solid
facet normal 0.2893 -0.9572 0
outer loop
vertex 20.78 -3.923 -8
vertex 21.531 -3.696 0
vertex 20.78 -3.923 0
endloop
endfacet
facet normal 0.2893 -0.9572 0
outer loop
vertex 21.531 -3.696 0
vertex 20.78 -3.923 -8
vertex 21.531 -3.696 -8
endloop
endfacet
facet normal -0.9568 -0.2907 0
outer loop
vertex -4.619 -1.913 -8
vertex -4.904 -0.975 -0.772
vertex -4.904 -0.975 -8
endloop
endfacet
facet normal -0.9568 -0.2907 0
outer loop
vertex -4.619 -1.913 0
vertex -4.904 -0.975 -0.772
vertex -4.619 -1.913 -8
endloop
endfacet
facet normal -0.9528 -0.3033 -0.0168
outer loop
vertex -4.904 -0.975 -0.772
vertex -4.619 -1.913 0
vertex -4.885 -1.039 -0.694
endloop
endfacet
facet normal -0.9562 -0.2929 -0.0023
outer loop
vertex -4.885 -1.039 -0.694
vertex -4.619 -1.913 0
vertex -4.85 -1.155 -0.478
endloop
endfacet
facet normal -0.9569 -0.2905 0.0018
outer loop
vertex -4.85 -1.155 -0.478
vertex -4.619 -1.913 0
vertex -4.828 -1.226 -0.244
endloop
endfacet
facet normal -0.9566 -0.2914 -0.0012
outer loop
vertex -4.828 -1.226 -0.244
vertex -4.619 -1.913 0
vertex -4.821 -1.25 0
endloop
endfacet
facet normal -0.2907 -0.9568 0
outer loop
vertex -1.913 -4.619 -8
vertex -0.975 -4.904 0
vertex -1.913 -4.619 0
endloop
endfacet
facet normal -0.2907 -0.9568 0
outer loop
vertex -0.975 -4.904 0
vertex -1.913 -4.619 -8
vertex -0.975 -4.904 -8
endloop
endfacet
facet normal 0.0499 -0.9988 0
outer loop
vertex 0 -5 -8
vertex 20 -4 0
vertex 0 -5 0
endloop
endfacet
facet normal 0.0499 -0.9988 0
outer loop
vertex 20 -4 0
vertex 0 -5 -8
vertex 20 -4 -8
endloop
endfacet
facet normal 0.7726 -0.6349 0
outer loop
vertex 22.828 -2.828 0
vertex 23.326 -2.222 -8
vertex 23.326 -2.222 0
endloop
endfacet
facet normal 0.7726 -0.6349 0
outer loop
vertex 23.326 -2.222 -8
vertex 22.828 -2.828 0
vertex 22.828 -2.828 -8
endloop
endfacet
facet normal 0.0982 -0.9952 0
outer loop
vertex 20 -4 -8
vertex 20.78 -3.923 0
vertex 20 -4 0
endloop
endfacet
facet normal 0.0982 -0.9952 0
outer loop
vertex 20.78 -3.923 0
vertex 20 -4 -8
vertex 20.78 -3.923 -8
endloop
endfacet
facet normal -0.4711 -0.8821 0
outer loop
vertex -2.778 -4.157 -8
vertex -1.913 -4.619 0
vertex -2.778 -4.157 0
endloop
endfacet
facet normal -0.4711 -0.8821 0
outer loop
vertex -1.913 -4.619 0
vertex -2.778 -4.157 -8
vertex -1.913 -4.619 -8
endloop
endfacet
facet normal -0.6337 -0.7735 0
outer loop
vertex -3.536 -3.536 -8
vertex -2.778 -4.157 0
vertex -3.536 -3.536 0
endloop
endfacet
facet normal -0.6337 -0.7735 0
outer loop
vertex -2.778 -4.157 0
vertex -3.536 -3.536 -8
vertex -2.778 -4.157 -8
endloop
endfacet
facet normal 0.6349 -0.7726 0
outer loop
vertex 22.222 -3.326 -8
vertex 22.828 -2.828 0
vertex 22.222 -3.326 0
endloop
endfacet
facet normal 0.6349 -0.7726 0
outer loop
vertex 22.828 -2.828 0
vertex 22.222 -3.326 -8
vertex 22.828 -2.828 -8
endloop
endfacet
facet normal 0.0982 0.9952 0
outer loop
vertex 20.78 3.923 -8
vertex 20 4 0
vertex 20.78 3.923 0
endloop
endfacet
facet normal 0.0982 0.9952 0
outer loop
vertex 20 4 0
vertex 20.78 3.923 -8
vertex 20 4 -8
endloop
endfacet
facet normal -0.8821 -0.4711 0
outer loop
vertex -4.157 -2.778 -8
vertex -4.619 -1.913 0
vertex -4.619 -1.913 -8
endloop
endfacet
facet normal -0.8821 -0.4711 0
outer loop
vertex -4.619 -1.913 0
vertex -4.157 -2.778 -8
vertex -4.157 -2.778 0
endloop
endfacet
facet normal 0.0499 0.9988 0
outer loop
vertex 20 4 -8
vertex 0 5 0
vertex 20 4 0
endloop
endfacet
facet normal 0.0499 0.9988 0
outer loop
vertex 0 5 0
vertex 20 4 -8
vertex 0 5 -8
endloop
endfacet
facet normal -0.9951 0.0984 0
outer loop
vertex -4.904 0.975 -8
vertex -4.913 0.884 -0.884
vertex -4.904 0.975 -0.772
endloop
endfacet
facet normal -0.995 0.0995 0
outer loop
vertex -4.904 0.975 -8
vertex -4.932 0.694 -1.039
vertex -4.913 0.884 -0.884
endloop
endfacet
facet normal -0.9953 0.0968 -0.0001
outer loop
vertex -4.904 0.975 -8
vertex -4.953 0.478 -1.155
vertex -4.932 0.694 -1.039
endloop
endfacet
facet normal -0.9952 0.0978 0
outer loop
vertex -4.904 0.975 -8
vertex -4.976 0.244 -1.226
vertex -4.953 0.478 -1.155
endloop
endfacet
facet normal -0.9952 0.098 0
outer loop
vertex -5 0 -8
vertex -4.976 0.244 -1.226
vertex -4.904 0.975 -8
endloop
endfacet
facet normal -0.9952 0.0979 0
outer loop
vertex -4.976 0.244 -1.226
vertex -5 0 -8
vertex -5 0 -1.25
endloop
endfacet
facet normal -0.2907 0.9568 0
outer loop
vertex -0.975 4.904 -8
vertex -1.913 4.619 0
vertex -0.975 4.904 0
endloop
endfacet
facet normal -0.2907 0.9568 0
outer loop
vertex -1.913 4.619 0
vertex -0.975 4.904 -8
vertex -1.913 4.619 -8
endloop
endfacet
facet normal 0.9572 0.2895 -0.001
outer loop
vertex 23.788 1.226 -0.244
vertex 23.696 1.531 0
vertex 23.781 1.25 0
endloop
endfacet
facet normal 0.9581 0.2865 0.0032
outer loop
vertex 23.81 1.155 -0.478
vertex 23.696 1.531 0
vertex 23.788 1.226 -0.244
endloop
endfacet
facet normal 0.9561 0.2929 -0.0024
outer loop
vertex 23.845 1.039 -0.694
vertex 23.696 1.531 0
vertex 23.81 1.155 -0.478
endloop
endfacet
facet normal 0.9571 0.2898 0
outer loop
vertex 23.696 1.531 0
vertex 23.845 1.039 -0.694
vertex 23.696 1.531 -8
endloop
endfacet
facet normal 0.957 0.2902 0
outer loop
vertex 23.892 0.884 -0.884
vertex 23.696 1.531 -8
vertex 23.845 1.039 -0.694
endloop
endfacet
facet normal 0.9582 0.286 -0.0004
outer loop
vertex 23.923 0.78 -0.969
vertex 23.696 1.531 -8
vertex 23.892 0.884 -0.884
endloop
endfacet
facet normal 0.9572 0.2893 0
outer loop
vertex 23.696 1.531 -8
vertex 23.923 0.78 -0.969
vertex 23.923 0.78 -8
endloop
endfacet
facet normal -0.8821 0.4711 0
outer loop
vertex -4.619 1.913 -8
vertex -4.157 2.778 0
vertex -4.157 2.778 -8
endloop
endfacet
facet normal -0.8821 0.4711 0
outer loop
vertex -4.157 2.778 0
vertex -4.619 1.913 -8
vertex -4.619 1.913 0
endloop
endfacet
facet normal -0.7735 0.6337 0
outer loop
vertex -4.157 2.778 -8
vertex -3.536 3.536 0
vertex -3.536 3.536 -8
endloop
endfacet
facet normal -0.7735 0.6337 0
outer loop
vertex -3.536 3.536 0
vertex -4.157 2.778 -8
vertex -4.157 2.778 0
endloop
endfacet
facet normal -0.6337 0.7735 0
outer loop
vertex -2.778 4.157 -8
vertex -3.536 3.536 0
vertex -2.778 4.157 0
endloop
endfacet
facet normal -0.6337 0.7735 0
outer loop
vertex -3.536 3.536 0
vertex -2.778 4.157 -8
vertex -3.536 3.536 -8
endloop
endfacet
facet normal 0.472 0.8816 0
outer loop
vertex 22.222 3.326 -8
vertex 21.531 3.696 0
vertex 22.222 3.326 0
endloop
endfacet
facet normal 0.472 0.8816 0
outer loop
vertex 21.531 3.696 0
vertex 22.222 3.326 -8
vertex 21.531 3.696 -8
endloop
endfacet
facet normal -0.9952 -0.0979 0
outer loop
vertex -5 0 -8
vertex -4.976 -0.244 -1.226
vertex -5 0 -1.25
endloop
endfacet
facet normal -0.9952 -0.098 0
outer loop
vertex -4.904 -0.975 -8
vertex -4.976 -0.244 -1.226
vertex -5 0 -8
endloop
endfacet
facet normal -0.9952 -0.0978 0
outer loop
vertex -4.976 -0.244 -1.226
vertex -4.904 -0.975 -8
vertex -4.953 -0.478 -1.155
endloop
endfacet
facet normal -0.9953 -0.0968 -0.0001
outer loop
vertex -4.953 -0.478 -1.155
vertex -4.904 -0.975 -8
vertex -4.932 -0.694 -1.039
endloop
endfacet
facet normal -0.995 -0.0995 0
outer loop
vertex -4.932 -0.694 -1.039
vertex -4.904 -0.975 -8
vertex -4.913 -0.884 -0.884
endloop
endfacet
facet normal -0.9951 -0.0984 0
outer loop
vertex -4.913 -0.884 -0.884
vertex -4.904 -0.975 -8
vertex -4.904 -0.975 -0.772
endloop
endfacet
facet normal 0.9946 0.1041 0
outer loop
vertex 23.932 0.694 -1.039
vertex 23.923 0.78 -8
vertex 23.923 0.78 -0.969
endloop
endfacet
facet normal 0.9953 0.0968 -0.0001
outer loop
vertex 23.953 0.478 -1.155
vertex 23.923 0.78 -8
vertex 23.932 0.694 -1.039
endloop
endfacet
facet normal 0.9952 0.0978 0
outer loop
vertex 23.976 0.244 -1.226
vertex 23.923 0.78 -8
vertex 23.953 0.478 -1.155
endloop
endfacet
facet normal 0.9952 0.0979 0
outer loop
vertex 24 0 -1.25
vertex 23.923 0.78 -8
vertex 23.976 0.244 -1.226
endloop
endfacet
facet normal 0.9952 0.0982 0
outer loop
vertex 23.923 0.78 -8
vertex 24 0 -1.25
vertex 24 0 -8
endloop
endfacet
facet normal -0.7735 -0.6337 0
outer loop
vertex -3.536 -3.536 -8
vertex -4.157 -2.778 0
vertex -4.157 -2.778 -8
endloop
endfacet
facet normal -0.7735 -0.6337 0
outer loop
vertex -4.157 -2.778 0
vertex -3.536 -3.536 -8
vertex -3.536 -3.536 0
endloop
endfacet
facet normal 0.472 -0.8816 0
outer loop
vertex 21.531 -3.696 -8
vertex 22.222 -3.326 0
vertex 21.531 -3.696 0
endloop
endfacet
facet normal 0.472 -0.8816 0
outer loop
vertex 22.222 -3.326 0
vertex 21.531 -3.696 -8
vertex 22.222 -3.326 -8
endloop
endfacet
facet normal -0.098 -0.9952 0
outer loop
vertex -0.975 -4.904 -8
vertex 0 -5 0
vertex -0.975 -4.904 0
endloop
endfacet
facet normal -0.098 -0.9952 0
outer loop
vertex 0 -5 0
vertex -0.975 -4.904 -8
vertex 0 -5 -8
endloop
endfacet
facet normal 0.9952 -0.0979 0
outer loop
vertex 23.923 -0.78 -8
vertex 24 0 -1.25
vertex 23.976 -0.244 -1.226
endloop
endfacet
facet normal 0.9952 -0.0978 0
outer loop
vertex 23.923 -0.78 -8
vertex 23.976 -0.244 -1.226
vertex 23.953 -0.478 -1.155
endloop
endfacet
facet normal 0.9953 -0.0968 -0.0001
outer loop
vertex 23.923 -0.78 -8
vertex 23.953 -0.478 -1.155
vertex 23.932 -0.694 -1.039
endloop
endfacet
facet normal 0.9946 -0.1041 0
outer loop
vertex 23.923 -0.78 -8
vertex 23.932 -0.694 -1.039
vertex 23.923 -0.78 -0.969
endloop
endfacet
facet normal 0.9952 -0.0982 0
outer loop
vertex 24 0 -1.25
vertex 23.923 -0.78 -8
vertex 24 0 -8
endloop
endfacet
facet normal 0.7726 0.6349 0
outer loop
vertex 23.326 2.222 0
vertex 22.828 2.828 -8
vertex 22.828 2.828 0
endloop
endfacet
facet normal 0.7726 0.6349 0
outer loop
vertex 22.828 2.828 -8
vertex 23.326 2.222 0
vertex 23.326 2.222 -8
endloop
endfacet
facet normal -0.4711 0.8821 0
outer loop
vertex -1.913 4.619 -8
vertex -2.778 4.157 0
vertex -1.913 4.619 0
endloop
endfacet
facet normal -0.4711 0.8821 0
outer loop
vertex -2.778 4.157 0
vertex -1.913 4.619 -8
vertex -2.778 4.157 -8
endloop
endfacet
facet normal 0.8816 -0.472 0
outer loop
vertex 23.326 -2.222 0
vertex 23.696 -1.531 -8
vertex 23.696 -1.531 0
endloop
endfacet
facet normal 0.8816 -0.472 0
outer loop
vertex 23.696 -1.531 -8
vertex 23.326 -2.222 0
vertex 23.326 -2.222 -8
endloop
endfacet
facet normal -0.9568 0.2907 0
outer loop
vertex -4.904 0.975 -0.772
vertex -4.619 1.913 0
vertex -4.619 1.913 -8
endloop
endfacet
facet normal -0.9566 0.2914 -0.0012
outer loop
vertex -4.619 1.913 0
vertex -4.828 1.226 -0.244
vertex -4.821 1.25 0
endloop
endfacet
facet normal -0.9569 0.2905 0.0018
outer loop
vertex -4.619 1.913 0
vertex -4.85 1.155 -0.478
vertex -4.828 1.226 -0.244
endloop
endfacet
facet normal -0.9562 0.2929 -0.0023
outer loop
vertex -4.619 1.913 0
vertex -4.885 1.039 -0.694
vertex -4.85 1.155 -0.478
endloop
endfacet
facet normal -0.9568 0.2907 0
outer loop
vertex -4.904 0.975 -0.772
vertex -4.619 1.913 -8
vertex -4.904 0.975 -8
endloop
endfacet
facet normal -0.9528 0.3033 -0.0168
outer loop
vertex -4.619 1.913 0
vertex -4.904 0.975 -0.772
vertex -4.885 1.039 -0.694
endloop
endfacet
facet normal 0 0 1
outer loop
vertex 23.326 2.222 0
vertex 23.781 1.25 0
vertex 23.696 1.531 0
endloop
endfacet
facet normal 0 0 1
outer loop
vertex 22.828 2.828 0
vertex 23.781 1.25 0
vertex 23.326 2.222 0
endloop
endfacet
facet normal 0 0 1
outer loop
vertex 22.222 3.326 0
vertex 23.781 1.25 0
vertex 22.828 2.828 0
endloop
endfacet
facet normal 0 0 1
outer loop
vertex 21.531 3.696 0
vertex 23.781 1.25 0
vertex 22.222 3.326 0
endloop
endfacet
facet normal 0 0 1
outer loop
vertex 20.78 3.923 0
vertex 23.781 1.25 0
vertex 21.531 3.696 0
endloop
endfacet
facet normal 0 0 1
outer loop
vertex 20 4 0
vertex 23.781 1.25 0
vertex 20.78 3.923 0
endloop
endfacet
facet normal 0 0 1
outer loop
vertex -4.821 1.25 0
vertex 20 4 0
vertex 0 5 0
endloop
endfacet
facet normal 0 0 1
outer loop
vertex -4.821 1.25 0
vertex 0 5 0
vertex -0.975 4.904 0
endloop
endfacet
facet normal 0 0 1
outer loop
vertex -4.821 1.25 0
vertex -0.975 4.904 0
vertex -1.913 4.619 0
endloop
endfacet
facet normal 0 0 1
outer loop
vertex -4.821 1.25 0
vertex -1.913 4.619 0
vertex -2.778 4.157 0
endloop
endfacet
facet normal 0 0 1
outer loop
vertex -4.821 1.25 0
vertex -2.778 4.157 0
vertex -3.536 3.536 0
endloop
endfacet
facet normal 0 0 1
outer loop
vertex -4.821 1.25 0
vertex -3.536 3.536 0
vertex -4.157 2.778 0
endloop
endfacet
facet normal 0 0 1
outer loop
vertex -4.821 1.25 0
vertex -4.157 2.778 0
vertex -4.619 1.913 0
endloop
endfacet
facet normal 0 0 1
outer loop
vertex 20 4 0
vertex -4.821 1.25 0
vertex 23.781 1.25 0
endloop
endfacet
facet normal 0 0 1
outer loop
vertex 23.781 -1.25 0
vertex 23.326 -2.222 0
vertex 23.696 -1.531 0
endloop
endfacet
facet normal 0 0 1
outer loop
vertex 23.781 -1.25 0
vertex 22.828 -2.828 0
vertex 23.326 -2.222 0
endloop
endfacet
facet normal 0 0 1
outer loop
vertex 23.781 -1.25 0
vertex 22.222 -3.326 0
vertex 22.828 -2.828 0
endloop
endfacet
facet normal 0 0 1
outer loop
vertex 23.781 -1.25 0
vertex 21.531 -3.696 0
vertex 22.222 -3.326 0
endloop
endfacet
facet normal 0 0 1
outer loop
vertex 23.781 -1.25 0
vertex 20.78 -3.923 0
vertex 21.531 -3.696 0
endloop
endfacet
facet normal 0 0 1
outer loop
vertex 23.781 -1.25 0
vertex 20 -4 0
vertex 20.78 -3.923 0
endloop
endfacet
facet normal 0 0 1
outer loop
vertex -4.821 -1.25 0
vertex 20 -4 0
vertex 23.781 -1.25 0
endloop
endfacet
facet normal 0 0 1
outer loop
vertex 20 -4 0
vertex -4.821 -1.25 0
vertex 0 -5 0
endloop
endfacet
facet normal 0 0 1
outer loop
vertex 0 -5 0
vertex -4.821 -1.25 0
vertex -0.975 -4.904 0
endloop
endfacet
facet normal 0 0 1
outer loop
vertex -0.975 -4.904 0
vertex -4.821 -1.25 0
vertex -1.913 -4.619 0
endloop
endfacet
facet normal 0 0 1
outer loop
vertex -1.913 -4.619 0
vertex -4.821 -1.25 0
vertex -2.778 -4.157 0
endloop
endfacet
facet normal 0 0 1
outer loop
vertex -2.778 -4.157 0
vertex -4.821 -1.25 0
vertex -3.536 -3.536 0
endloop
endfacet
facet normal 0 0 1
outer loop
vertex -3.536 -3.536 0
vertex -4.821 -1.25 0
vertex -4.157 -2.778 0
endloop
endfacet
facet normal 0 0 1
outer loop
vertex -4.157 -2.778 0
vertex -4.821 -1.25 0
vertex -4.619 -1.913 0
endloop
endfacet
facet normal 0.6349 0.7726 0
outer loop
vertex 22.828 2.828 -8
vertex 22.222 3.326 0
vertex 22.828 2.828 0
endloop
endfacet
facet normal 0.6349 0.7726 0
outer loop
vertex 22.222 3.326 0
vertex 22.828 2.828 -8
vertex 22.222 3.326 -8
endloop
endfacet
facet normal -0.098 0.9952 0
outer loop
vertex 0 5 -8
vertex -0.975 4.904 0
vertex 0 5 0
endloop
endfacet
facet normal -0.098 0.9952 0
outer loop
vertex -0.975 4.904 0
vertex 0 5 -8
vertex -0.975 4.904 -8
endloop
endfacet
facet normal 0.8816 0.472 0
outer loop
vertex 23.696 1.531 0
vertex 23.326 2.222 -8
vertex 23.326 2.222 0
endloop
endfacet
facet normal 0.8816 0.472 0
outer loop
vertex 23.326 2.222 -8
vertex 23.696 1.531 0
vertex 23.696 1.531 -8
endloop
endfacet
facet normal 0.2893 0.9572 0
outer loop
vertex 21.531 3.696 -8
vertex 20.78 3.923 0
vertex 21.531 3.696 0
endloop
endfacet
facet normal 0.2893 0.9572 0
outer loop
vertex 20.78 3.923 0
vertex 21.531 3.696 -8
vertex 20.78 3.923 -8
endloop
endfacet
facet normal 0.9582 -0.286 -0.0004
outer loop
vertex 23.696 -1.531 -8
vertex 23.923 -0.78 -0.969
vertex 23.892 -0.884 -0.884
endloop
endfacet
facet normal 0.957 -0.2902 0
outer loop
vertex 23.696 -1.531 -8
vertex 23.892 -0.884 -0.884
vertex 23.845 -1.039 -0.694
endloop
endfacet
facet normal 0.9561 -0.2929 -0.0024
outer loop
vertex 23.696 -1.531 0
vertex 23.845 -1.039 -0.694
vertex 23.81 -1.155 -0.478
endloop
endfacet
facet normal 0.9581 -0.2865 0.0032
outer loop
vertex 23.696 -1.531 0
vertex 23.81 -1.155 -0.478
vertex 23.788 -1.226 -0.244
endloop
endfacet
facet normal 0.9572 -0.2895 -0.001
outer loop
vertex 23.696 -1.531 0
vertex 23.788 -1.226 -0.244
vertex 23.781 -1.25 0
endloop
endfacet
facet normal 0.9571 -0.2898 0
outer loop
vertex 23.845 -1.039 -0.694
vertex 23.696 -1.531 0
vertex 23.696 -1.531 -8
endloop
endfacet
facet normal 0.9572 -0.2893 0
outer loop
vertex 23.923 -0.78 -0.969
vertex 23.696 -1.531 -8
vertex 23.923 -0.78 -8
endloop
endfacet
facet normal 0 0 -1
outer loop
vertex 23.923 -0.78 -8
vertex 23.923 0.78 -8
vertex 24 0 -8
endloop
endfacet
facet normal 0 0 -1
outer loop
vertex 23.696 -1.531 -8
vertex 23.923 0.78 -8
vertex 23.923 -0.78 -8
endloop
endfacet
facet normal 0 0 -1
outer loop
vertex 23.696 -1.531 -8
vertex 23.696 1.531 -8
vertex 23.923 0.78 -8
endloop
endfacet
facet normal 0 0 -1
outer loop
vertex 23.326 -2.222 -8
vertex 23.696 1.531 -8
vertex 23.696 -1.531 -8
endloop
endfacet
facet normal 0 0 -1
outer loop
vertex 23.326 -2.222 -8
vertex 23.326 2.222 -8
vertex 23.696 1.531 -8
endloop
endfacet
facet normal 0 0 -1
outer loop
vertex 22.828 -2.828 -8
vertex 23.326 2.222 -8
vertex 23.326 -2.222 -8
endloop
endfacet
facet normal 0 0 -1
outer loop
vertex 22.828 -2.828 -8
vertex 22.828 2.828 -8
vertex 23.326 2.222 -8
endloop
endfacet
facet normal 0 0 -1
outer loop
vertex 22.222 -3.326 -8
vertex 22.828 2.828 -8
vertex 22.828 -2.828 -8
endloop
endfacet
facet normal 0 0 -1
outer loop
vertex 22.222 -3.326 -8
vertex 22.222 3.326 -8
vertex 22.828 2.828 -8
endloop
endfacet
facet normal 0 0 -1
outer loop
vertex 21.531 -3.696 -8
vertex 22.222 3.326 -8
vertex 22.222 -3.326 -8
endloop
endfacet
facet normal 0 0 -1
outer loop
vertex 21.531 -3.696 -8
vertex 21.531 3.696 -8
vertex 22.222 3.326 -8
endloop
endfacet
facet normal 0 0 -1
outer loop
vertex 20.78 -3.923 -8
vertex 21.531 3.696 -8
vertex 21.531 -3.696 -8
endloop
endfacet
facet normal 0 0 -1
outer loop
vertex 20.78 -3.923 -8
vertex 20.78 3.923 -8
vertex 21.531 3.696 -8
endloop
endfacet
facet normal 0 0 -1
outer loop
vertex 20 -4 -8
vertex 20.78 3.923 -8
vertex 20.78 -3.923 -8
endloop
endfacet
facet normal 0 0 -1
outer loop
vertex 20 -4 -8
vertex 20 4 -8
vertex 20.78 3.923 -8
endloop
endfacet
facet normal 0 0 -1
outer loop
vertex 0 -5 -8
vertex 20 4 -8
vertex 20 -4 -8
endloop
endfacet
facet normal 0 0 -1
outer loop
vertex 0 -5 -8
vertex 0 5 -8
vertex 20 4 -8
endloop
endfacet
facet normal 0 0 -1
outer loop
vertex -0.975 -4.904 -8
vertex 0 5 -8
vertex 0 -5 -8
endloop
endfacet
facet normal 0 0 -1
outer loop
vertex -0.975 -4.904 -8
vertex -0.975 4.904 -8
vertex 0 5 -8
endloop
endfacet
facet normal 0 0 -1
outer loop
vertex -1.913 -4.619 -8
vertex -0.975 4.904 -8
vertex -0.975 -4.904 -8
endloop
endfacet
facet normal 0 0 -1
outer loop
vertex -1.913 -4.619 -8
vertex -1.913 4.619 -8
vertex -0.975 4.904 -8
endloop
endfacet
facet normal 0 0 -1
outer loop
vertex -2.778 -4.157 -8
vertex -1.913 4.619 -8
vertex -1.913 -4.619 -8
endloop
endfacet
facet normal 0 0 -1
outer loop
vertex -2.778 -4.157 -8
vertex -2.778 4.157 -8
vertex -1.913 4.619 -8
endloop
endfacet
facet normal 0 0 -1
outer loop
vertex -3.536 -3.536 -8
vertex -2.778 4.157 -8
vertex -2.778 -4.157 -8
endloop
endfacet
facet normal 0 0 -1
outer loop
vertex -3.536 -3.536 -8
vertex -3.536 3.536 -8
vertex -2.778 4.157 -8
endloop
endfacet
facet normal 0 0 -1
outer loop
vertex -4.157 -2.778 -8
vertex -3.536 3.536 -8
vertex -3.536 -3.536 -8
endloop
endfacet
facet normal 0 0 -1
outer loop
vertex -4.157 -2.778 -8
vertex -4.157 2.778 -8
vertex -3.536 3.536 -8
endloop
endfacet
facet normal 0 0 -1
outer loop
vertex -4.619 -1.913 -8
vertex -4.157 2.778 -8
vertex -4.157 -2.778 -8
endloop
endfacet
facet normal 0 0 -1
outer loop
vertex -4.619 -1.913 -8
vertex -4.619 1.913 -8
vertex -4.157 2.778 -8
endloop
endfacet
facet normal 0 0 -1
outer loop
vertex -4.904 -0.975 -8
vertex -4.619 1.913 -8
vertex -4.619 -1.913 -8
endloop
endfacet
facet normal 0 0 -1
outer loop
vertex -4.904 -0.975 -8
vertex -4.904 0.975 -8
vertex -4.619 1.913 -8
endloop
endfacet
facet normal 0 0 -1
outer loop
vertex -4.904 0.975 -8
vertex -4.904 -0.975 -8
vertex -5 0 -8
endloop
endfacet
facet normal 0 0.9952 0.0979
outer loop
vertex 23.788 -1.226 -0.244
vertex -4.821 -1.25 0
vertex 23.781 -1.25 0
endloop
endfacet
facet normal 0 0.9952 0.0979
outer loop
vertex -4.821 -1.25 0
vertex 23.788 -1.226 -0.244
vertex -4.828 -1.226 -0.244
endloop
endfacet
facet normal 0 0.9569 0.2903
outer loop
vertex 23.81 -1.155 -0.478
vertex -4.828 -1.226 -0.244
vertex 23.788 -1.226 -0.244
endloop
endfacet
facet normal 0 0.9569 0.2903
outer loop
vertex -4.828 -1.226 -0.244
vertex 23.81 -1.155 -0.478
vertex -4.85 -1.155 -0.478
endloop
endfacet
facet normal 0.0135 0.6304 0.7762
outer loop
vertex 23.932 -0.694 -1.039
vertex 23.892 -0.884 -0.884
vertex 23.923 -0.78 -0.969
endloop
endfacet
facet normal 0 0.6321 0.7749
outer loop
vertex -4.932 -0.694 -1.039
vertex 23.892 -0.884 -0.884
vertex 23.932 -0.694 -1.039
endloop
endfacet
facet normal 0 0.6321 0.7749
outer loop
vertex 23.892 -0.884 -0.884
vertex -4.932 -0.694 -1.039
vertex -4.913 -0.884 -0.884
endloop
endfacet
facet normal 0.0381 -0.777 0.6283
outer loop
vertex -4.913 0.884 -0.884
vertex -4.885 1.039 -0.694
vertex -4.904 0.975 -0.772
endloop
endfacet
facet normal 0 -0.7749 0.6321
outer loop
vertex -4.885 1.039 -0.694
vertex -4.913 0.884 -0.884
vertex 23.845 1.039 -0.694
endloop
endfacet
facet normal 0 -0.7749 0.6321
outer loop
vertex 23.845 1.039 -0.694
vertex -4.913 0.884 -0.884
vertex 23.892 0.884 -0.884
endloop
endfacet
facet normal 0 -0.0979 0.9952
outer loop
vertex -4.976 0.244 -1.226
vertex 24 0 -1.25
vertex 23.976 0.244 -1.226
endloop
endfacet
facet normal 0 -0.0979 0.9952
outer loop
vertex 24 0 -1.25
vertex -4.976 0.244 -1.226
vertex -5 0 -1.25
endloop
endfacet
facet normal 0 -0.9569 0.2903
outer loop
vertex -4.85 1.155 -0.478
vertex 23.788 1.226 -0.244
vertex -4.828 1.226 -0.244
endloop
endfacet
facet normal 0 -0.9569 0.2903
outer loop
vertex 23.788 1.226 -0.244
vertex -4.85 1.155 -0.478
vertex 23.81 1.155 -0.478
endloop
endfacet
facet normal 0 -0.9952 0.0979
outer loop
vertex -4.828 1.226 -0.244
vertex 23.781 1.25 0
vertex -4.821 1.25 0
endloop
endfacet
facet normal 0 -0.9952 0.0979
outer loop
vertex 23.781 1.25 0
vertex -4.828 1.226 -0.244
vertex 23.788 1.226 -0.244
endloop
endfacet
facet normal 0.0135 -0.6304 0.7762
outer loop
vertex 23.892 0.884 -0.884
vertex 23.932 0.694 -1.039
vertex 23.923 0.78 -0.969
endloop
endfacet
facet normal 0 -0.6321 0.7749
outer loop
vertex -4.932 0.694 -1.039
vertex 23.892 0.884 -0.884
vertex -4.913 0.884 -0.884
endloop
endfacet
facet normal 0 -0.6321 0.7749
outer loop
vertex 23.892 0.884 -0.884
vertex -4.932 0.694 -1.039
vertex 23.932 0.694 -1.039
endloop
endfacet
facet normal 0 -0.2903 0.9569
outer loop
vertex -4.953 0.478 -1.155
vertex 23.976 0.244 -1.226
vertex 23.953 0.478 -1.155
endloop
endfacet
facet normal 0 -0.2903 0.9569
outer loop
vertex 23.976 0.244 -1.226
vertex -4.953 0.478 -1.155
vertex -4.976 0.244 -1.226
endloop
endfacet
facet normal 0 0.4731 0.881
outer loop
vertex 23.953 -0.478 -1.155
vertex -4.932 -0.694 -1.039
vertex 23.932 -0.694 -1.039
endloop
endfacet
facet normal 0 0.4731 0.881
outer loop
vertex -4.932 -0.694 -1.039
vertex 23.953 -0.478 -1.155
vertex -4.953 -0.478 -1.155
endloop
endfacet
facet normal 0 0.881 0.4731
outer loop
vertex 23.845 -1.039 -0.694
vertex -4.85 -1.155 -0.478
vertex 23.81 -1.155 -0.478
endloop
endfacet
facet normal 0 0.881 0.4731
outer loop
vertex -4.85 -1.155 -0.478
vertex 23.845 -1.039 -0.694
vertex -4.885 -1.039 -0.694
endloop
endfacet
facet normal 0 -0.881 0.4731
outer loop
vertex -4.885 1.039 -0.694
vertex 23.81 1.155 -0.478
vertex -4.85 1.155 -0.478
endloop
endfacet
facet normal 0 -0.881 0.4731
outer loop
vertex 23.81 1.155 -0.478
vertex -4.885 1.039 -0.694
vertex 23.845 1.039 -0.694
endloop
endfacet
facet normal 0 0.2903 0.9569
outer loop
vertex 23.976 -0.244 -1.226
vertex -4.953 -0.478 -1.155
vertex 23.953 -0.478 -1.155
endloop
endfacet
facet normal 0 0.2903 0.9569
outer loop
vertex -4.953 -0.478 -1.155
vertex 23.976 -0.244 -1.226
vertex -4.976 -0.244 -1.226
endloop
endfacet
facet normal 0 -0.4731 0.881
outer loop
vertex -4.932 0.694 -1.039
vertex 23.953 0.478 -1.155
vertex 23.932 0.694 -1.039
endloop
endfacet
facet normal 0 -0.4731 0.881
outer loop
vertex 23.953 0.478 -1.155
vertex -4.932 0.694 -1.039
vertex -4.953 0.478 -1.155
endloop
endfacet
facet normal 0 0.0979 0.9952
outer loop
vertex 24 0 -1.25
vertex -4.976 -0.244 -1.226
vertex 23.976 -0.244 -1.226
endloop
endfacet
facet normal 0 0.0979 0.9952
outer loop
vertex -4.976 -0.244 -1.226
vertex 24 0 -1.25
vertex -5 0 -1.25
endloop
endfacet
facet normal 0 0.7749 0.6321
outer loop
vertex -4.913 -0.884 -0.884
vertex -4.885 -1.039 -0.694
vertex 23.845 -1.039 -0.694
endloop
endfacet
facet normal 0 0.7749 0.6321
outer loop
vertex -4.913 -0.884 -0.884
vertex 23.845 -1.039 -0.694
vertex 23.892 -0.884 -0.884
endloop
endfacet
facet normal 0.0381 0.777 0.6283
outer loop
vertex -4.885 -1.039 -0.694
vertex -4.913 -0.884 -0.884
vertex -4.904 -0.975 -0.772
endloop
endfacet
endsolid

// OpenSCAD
// COBRA Finger Segment - MIDDLE
// Length: 20.0mm, Width: 10mm

$fn = 32;

module finger_segment() {
    difference() {
        hull() {
            translate([0, 0, -4])
            cylinder(h=8, d=10, center=true);
            
            translate([20.0, 0, -4])
            cylinder(h=8, d=8.0, center=true);
        }
        
        // Tendon channel
        translate([10.0, 0, 0])
        rotate([0, 90, 0])
        cylinder(h=22.0, d=2.5, center=true);
        
        // Pivot holes
        translate([0, 0, 0])
        rotate([0, 90, 0])
        cylinder(h=12, d=2.5, center=true);
        
        translate([20.0, 0, 0])
        rotate([0, 90, 0])
        cylinder(h=12, d=2.5, center=true);
    }
}

finger_segment();
